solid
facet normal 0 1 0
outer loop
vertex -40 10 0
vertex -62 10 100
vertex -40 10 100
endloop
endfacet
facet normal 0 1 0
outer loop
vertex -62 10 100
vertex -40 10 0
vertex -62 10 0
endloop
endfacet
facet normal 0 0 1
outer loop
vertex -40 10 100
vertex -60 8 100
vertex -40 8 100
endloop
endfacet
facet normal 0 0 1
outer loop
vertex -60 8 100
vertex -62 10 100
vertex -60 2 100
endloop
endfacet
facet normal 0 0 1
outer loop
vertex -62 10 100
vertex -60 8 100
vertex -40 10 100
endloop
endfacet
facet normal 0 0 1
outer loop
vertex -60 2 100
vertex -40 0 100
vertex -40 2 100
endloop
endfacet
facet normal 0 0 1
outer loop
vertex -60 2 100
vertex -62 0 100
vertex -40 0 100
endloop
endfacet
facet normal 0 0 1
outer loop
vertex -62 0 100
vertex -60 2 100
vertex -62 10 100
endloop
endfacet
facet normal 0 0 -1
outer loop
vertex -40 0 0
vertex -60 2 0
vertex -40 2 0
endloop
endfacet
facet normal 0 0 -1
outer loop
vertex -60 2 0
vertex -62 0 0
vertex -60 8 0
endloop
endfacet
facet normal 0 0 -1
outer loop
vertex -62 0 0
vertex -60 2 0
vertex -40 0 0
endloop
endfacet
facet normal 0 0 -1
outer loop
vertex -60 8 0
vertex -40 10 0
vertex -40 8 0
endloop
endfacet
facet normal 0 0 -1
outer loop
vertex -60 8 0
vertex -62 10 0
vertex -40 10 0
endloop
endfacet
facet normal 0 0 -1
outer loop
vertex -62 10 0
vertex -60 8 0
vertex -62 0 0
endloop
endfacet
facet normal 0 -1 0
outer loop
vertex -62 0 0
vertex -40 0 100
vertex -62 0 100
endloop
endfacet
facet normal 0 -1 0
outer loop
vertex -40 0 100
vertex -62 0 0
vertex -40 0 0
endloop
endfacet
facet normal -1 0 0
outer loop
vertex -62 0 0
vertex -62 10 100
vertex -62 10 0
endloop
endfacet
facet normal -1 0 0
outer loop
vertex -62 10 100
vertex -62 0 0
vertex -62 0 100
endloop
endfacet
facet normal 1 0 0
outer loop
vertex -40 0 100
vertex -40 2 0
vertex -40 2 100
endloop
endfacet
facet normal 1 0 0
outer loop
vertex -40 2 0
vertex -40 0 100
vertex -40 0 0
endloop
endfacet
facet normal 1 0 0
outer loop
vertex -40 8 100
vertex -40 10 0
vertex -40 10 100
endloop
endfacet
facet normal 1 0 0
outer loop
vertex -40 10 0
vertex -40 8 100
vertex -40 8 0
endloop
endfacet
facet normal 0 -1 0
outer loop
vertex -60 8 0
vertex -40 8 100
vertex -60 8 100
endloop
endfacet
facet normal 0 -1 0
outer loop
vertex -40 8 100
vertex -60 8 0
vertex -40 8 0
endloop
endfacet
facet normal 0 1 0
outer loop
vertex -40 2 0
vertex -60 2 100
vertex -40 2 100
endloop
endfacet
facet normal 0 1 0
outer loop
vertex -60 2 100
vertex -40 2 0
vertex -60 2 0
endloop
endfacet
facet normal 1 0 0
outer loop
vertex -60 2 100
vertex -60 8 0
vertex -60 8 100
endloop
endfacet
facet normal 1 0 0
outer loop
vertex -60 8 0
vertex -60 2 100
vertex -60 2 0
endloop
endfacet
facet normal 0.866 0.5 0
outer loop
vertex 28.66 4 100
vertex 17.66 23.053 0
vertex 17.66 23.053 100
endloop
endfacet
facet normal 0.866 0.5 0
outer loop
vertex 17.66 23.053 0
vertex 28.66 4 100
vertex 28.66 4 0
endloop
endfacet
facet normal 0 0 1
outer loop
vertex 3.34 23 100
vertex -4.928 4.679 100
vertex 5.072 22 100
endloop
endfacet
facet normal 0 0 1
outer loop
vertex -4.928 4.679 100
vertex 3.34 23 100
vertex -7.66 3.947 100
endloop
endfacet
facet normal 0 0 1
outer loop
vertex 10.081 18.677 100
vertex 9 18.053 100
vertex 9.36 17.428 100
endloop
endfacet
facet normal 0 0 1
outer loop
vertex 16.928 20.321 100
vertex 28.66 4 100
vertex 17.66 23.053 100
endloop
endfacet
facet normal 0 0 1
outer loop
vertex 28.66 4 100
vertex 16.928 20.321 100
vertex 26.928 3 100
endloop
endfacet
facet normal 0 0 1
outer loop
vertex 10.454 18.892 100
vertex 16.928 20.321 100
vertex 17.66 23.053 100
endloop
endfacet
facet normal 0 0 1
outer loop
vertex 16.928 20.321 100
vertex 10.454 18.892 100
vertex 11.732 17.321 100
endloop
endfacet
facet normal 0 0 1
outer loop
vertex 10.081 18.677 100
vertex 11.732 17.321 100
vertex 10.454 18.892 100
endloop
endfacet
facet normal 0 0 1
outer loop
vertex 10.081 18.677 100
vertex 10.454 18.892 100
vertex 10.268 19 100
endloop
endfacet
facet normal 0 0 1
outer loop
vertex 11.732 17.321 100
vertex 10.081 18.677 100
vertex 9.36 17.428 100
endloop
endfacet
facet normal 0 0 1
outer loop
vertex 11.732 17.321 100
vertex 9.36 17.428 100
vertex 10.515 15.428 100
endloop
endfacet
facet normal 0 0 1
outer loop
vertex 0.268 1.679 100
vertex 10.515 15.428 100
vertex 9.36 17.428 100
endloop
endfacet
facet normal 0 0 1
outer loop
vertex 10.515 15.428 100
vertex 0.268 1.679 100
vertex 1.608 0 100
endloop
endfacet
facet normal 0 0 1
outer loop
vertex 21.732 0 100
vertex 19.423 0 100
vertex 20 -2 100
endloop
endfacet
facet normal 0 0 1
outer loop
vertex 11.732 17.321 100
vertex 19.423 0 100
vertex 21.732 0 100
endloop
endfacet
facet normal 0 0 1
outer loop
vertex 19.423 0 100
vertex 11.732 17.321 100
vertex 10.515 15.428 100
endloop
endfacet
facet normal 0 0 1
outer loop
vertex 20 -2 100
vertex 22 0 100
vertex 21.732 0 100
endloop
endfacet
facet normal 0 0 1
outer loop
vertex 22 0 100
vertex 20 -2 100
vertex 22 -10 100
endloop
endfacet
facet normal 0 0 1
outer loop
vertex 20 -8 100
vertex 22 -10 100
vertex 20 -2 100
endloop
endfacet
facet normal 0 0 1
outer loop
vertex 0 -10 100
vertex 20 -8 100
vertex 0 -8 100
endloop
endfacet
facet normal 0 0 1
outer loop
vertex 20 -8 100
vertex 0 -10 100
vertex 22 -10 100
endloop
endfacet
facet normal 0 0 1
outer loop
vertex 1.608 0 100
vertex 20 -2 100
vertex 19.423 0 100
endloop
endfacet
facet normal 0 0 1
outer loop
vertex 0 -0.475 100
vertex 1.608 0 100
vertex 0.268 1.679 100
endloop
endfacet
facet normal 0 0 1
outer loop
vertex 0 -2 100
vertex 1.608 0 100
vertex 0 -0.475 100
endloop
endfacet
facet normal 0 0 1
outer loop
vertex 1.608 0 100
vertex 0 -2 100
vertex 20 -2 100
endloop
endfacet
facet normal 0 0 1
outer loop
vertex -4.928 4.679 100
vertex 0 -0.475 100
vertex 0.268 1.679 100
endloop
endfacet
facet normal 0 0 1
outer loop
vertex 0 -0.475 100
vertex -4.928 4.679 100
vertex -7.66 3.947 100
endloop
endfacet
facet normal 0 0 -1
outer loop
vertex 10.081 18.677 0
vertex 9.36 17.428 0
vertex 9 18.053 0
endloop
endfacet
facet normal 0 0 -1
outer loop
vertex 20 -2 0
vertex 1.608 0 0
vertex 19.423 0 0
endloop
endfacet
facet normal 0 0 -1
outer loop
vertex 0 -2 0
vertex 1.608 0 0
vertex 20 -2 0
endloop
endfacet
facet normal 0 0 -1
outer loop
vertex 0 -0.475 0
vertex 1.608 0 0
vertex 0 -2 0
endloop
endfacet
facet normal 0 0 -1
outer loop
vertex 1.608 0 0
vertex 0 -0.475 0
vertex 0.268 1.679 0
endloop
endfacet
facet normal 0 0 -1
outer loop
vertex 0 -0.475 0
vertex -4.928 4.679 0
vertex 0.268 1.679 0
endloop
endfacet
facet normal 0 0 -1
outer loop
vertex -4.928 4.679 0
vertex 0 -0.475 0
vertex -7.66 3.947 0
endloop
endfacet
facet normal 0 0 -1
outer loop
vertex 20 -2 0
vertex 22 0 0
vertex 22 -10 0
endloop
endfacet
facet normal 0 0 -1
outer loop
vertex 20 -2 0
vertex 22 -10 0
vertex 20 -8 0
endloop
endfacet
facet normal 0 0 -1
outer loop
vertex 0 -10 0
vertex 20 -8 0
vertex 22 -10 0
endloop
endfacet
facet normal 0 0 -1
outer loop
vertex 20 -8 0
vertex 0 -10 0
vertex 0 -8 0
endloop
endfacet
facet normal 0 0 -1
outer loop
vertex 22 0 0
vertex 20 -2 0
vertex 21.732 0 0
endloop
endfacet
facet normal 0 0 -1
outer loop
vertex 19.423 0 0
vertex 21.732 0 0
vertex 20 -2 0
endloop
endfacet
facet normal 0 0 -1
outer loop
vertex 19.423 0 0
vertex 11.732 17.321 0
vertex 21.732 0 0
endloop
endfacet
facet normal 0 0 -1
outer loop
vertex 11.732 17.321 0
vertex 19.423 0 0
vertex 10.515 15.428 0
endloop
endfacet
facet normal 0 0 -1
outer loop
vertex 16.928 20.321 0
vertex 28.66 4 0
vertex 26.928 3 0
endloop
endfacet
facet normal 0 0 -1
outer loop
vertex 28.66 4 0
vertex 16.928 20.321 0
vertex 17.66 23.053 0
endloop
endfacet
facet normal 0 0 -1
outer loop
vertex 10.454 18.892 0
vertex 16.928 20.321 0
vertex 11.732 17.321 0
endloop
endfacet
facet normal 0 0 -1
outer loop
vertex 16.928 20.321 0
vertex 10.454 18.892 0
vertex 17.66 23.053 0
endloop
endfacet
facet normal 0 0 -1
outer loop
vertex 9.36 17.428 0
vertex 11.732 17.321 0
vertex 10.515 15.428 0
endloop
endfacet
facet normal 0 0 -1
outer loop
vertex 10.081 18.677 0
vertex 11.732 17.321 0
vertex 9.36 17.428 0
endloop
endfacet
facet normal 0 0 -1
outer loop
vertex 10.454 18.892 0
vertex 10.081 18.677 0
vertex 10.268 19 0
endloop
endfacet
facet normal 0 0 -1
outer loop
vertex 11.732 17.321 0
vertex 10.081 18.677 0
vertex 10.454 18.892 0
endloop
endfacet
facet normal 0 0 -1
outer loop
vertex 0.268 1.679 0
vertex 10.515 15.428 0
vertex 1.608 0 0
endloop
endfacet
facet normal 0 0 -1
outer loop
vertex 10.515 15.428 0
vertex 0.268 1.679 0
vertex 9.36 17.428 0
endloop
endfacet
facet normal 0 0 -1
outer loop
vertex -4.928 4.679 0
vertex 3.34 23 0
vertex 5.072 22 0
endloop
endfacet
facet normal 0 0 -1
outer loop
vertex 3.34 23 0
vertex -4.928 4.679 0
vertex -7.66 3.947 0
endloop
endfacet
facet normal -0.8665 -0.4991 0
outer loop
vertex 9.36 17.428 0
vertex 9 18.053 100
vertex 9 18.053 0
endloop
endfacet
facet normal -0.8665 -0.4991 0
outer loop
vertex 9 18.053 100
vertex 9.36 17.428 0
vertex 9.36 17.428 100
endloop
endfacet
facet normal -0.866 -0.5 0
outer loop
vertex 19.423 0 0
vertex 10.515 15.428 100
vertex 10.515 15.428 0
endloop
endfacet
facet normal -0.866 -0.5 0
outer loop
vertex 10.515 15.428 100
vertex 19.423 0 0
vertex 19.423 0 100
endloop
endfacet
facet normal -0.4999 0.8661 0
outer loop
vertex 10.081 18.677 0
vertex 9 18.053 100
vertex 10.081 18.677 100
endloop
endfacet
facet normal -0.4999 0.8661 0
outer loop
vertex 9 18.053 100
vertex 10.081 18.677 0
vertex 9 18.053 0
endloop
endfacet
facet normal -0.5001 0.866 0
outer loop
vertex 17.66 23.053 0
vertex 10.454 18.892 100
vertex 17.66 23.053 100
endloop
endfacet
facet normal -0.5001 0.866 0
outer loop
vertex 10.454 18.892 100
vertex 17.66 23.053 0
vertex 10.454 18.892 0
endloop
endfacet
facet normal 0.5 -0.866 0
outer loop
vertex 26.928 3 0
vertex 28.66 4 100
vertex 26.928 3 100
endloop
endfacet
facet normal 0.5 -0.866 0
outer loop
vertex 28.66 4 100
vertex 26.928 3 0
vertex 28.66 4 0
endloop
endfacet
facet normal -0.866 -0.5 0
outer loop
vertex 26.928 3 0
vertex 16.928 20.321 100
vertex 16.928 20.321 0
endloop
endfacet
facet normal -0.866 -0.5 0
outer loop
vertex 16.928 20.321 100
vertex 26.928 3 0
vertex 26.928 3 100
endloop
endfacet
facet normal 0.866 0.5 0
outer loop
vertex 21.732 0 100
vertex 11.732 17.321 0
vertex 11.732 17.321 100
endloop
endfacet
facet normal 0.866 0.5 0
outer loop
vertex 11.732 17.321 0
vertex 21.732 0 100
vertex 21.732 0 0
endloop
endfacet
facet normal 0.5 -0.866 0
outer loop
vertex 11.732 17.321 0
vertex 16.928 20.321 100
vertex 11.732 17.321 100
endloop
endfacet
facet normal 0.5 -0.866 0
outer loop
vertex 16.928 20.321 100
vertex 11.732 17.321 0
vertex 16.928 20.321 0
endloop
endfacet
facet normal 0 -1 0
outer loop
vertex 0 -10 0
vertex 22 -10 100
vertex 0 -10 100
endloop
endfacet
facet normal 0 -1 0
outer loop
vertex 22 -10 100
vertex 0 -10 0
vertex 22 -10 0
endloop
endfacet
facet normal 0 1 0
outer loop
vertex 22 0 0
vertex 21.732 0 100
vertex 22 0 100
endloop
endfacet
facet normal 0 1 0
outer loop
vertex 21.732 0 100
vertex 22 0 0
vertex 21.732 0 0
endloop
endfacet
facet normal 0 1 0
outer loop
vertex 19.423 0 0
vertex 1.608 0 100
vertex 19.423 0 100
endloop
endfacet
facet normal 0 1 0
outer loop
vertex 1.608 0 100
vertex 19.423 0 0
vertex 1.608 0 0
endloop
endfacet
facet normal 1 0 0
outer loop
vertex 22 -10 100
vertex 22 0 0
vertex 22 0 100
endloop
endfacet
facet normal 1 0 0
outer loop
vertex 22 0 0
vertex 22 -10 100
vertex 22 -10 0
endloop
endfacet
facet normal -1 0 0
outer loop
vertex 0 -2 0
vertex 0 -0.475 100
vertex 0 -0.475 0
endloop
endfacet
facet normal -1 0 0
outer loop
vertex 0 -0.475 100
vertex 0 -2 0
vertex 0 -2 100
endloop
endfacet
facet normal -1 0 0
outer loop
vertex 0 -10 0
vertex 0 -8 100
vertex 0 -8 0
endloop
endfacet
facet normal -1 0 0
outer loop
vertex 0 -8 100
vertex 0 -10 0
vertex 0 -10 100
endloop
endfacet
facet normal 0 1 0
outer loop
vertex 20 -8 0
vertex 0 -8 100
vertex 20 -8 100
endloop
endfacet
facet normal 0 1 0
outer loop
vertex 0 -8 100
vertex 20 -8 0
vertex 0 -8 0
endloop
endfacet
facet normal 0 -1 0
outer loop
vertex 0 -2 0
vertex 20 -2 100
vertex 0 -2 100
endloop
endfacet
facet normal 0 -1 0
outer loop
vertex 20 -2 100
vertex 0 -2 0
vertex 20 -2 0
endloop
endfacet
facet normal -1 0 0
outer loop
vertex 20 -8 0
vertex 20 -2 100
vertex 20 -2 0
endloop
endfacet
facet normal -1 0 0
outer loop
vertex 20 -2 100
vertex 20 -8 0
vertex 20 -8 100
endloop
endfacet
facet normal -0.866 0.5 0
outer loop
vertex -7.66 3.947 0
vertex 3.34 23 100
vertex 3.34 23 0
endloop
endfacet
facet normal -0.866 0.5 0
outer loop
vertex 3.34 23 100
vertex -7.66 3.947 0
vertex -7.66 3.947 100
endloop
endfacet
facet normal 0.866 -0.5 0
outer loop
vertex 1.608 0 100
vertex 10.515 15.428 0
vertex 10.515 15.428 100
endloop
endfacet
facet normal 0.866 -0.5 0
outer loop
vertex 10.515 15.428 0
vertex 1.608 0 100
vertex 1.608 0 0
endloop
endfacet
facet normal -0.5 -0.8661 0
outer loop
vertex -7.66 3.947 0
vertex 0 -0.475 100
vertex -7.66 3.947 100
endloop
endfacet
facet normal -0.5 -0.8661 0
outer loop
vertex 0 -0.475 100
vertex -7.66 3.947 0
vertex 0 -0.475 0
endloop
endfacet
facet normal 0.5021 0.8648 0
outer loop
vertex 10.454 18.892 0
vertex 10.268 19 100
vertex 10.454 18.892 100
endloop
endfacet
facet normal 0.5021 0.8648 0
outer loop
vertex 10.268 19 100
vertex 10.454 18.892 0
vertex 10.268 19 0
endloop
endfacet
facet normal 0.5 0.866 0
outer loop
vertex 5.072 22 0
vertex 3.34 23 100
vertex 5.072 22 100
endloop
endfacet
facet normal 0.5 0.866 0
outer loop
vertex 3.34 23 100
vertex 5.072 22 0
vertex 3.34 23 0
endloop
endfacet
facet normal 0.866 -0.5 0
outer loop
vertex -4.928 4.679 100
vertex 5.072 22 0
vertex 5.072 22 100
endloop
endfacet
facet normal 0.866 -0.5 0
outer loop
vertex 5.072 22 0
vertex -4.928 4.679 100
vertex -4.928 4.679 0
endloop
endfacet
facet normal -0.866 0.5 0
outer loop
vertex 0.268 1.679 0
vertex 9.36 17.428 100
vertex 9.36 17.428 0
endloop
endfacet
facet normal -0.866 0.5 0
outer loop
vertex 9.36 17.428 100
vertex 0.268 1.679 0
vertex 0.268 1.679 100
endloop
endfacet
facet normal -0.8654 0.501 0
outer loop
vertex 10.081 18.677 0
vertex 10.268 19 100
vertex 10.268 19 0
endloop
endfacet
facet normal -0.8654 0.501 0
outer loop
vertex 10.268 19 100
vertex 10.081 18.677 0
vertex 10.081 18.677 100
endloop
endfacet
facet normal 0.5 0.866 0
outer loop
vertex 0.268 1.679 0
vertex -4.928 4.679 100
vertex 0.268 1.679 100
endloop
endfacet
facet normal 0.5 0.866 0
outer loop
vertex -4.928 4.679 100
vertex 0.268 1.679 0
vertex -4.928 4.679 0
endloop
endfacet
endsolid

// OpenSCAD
/* 2021-11-10 dishwasher status sign */
/* by Torfinn Ingolfsen */

// History:
// 2021-11-12 removed the sign holder, I can just write on the sides with a marker. Reduced depth of pocket to 6 mm. Reduced with of gadget to 100 mm.
// 2021-11-10 initial version
//

preview_bug_fix = $preview ? 0.1 : 0;
sign_length = 100; // the gadget is going to be 110 mm wide
sign_height = 20; // and 20 mm high
side_depth = 6;  // was 10, try with 6 instead
side_thickness = 2;
holder_thickness = 1;
print_holder = false;
print_main = true;
debug = true;

// sign holder to put in a paper / cardboard sign
module sign_holder() {
    translate([holder_thickness + holder_thickness, 0, 0]) {
        cube([holder_thickness,holder_thickness + holder_thickness, sign_length]);
    }
    translate([holder_thickness, 0, 0]) {
        cube([holder_thickness,holder_thickness,sign_length]);
    }
    color("blue") {
        cube([holder_thickness,sign_height + side_thickness, sign_length]);
    }
    translate([holder_thickness + holder_thickness, sign_height, 0]) {
        color("red") {
            cube([holder_thickness,holder_thickness + holder_thickness, sign_length]);
        }
    }
    translate([holder_thickness, sign_height + holder_thickness, 0]) {
        cube([holder_thickness, holder_thickness, sign_length]);
    }
}

module side() {
    difference() {
        cube([side_depth + side_thickness + side_thickness, sign_height + side_thickness, sign_length]);
        translate([side_thickness, 0, 0]) {
            cube([side_depth, sign_height, sign_length]);
        }
    }
    // translate([side_depth + side_thickness + side_thickness, 0, 0]) color("green") sign_holder();
}



// main
module main () {
    translate([sign_height, -side_thickness/2, 0]) {
        rotate([0,0,30]) {
            color("blue") {
                side();
            }
        }
    }
    rotate([0,0, -90]) {
        color("red") {
            side();
        }
    }
    translate([(sign_height)/2 + side_thickness,sign_height - side_thickness,0]) {
        rotate([0,0, 150]) {
            color("green") {
                side();
            }
        }
    }
}

if (debug) {
    translate([-40,0,0]) {
        rotate([0,0,90]) {
            side();
        }
    }
}

if (print_main) {
    translate([0,0,0]) {
        main(); 
    }
}

if (print_holder) {
    translate([40,0,0]) {
        sign_holder(); 
    }
}
